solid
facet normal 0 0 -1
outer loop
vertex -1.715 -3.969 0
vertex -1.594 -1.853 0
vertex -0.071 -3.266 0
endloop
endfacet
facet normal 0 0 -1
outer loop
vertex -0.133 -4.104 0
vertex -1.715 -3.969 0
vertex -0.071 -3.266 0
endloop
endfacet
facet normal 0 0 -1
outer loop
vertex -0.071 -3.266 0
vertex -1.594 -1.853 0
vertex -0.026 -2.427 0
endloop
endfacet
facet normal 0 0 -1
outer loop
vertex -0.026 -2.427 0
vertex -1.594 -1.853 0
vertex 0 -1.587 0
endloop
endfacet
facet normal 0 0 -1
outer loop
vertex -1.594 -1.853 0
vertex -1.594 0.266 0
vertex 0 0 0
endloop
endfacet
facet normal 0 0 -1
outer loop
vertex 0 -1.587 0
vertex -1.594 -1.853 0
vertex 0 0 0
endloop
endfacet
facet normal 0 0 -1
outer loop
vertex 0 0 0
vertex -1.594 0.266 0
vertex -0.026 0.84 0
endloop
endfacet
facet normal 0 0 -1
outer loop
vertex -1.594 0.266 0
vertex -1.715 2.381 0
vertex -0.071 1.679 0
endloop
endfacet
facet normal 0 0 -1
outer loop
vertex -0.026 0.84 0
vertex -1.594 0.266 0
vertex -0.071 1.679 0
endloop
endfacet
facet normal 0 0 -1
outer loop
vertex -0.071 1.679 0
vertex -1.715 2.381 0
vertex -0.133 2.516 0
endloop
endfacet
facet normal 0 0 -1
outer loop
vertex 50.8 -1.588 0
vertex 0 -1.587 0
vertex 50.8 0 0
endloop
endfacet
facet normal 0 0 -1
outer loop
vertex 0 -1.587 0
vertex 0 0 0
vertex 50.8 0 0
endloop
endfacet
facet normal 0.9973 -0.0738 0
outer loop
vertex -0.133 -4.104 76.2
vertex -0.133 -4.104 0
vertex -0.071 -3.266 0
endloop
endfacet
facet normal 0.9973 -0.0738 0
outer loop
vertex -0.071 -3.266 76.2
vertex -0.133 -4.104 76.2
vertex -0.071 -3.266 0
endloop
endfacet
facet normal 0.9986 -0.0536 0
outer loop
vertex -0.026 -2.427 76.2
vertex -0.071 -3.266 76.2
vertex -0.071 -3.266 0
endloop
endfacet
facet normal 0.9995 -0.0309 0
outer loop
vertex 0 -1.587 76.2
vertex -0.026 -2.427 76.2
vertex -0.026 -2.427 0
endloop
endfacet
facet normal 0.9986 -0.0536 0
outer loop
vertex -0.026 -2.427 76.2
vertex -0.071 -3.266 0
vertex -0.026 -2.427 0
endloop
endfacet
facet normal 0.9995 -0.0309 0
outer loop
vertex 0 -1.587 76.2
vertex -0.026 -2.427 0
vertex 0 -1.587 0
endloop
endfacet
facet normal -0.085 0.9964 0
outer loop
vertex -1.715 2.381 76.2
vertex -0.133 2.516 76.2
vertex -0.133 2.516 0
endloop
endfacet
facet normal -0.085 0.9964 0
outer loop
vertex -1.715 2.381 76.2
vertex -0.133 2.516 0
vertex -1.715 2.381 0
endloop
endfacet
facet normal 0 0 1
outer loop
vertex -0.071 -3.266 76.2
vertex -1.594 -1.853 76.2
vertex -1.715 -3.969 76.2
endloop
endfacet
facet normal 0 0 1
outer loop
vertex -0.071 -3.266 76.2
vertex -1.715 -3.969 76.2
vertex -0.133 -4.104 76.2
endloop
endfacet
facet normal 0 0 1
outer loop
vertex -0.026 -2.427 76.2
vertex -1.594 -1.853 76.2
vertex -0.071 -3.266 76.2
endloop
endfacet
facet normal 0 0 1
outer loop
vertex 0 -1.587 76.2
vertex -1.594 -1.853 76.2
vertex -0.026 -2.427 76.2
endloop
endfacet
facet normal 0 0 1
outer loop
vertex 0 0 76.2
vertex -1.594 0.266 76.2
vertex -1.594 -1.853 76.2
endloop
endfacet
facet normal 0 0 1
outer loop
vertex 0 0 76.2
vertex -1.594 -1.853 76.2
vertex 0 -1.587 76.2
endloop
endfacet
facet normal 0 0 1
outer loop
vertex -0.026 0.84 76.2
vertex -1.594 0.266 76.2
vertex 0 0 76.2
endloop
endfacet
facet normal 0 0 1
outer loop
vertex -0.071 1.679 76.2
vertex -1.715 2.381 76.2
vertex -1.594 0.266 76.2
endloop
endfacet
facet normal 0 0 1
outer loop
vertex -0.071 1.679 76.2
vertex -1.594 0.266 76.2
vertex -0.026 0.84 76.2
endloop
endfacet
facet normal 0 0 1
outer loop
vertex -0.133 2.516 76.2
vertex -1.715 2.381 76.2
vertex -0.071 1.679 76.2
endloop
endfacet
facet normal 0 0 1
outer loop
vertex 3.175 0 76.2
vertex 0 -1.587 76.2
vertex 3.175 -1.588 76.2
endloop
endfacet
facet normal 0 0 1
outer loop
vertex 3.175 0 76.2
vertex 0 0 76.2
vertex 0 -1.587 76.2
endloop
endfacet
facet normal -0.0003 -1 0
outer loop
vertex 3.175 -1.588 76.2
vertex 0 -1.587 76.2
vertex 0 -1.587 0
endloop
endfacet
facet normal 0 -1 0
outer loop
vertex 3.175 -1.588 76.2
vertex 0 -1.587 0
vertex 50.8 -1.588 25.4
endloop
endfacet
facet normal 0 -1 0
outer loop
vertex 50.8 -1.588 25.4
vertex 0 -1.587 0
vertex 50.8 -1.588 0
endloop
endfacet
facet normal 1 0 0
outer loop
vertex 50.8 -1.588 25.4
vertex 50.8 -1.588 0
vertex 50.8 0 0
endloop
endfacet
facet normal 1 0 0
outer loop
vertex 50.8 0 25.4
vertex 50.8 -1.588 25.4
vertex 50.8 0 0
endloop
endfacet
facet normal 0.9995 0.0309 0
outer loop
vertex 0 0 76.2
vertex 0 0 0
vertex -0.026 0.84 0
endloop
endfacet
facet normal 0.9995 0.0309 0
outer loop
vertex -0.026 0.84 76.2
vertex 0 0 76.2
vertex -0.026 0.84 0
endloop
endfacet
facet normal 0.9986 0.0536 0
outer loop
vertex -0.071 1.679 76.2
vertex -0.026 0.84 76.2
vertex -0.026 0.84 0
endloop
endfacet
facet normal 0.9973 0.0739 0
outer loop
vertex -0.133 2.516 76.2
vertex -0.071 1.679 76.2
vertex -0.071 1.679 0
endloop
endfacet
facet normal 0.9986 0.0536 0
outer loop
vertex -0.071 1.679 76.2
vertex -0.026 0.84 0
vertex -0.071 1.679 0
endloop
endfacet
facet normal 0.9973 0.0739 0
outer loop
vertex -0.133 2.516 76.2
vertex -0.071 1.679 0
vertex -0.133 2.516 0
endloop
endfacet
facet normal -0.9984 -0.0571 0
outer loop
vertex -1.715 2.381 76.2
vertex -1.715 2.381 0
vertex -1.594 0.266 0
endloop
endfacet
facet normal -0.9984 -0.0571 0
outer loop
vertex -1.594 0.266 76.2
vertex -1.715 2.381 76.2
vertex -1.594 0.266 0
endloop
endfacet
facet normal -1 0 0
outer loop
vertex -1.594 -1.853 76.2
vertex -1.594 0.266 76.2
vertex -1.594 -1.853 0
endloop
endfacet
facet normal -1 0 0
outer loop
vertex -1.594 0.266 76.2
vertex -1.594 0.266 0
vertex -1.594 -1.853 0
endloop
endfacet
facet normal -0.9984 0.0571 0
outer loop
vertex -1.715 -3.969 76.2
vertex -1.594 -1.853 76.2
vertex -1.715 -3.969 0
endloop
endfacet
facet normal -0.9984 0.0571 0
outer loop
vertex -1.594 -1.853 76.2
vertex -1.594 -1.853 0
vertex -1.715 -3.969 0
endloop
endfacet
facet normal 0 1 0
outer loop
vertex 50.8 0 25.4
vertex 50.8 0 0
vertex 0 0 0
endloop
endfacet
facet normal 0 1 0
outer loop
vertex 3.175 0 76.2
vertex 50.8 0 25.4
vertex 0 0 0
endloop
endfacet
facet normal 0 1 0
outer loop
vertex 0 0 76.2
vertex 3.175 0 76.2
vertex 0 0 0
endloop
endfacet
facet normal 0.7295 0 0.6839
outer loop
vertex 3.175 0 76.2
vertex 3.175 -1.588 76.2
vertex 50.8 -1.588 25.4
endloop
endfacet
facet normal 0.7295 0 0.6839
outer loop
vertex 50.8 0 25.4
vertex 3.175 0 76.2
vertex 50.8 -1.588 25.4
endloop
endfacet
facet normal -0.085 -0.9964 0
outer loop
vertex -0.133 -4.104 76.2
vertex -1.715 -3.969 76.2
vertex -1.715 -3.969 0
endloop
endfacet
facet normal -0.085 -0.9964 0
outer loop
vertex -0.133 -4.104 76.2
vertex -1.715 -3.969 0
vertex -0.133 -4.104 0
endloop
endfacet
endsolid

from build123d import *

# Parameters (mm, degrees)
F1_DEPTH = 76.2
F3_DEPTH = 1.5875


with BuildPart() as f1:
    # F0 (on Top) → F1 (new body)
    with BuildSketch(Plane.XY):
        with BuildLine():
            Line((50.8, 0), (0, 0))
            ThreePointArc((0, 0), (-0.046113, 1.259244), (-0.132987, 2.516333))
            Line((-0.132987, 2.516333), (-1.71473, 2.38125))
            ThreePointArc((-1.71473, 2.38125), (-1.579401, -0.79375), (-1.71473, -3.96875))
            Line((-1.71473, -3.96875), (-0.132987, -4.103833))
            ThreePointArc((-0.132987, -4.103833), (-0.046113, -2.846744), (0, -1.5875))
            Line((0, -1.5875), (50.8, -1.5875))
            Line((50.8, -1.5875), (50.8, 0))
        make_face()
    extrude(amount=F1_DEPTH)

    # F2 (on face) → F3 (cut, through all)
    with BuildSketch(Plane.XZ.offset(1.5875)):
        Polygon((50.8, 76.2), (3.175, 76.2), (50.8, 25.4), align=None)
    extrude(amount=-F3_DEPTH, mode=Mode.SUBTRACT)


solid = f1.part
